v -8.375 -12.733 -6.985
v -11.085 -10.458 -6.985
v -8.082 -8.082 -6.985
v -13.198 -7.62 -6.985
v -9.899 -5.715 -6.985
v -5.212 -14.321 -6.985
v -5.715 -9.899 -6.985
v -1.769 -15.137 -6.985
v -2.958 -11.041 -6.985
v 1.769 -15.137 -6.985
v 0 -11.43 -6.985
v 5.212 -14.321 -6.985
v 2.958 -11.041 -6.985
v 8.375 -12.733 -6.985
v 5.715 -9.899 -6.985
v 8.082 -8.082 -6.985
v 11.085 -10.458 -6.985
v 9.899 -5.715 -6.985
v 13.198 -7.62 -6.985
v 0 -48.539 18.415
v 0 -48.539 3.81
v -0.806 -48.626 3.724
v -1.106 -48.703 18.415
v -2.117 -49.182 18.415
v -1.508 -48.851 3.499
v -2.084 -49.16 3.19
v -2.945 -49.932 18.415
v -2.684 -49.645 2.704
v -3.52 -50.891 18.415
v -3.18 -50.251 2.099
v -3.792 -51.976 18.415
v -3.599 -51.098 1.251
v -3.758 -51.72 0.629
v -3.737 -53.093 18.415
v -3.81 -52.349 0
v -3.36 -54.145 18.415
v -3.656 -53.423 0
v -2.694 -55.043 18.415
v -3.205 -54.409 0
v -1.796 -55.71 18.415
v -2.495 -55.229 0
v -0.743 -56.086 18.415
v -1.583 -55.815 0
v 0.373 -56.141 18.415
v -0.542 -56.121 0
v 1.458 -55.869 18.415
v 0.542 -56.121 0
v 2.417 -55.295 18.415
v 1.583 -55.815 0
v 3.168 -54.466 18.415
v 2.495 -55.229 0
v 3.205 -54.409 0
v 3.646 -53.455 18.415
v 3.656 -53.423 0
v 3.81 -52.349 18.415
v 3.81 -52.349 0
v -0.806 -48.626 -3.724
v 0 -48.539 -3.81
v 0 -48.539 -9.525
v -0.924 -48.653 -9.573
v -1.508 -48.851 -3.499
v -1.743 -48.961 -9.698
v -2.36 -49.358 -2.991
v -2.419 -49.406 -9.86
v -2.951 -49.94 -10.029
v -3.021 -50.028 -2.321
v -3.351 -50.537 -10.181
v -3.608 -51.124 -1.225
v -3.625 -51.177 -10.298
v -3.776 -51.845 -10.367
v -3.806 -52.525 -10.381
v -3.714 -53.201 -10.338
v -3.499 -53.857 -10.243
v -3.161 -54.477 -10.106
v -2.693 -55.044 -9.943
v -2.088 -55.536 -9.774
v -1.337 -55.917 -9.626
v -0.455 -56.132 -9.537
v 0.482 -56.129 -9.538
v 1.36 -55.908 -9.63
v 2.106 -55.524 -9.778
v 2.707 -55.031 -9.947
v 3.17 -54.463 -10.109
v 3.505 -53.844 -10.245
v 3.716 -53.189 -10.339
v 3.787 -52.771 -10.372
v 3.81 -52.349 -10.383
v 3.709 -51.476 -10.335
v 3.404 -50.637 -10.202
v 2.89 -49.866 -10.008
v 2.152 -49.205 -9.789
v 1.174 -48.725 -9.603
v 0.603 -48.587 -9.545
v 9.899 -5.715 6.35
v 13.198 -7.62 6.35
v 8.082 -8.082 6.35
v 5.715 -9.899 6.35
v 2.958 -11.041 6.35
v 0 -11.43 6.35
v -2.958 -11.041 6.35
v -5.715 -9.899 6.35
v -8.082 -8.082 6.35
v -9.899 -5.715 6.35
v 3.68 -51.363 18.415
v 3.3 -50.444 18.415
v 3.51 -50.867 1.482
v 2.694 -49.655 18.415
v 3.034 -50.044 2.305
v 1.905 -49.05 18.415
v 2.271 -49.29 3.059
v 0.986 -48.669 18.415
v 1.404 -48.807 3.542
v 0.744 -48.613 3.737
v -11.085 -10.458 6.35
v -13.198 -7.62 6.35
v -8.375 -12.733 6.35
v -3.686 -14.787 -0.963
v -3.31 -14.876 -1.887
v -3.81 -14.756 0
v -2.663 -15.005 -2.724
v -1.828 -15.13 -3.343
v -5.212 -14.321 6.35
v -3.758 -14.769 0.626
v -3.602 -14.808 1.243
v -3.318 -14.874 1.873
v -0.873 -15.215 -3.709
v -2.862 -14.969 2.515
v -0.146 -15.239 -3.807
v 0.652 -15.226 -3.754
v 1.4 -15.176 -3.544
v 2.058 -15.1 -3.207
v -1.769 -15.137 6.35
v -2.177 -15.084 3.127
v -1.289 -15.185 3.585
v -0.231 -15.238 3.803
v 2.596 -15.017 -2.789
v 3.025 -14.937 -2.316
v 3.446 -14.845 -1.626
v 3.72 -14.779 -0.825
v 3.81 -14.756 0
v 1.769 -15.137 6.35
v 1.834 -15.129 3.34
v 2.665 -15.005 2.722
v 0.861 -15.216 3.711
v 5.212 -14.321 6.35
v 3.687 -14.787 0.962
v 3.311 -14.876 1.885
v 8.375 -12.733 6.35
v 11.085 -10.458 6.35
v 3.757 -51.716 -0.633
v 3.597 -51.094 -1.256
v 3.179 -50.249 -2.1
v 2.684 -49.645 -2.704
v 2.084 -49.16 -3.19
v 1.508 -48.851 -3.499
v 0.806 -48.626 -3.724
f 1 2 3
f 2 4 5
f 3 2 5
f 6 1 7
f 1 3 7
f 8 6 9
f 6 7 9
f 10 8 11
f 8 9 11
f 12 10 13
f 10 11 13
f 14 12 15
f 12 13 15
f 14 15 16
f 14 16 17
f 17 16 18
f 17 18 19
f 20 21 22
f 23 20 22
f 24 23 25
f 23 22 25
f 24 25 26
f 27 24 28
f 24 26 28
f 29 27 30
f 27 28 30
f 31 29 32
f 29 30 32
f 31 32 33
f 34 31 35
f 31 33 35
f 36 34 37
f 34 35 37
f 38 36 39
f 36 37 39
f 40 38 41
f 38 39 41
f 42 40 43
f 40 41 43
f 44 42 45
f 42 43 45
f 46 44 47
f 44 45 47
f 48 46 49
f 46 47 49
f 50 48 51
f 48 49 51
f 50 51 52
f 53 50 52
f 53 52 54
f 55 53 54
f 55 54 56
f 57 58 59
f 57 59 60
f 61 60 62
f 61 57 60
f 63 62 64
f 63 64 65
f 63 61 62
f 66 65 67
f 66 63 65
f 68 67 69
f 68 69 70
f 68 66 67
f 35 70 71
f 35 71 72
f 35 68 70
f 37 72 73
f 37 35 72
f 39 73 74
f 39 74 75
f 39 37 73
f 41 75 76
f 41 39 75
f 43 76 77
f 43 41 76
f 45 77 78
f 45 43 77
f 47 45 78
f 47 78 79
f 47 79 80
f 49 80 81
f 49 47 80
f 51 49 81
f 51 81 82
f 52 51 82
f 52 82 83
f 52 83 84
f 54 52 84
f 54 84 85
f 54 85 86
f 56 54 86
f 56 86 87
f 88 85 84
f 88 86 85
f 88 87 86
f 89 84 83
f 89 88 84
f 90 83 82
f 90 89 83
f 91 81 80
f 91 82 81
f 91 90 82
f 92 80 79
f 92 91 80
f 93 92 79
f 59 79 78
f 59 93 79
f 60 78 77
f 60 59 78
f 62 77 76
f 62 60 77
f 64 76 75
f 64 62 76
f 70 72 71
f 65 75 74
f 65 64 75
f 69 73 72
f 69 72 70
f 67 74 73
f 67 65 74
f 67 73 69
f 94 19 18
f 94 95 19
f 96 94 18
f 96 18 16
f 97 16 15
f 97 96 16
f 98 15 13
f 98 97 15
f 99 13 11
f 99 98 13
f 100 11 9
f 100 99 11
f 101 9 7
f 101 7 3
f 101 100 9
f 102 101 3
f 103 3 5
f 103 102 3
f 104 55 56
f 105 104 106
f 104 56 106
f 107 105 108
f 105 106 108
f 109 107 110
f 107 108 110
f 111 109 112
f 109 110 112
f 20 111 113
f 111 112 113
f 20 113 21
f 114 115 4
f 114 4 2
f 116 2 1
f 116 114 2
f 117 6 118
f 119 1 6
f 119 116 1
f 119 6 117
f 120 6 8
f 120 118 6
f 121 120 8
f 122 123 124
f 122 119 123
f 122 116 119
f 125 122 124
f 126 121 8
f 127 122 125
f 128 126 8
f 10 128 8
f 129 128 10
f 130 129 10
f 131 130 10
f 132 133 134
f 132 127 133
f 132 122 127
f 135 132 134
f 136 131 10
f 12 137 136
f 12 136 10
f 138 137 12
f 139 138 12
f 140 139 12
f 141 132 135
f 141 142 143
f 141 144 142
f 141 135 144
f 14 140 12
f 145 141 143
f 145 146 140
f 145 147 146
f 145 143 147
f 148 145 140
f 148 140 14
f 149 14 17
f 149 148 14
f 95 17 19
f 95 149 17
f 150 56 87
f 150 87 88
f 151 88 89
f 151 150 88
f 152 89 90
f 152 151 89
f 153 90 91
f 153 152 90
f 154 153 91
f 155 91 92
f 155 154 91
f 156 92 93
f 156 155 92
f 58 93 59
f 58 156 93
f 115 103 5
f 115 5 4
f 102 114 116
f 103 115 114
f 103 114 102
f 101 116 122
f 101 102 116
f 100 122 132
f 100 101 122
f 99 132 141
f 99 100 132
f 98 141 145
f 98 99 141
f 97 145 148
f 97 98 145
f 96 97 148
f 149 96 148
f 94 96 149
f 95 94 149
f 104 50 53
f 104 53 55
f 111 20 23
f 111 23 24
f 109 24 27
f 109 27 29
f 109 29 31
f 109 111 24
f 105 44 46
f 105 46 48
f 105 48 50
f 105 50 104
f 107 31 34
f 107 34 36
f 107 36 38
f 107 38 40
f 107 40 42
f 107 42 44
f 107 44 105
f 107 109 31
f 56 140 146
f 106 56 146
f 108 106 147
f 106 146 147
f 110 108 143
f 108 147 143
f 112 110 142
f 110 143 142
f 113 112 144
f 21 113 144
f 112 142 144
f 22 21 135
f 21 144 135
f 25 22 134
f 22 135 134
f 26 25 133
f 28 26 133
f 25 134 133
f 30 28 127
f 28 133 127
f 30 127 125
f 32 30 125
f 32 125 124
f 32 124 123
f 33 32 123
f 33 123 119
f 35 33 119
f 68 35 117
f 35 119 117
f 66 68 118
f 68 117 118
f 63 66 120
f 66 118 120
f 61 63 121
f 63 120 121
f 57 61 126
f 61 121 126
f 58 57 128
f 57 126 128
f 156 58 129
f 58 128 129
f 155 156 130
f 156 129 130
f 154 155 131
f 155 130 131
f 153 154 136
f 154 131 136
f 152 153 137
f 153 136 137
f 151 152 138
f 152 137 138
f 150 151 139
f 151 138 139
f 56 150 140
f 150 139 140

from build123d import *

# Parameters (mm, degrees)
F0_R          = 3.81
F1_DEPTH      = 52.3494
F3_DEPTH      = 25.4
F3_DEPTH_BACK = 25.4
F4_DEPTH      = 6.35
F4_DEPTH_BACK = 6.985
F6_DEPTH      = 18.415
F6_DEPTH_BACK = 18.415
F7_R          = 8.89
F8_DEPTH      = 66.62603


with BuildPart() as f1:
    # F0 (on Front) → F1 (new body)
    with BuildSketch(Plane.XZ):
        Circle(F0_R)
    extrude(amount=F1_DEPTH)

    # F2 (on Top) → F3 (cut, two sides)
    with BuildSketch(Plane.XY) as f3_sk:
        with BuildLine():
            Line((0, 0), (-11.43, 0))
            ThreePointArc((-11.43, 0), (-11.0405321945, -2.9583016855), (-9.8986703653, -5.715))
            Line((-9.8986703653, -5.715), (0, 0))
        make_face()
        with BuildLine():
            ThreePointArc((-9.8986703653, -5.715), (0, -11.43), (9.8986703653, -5.715))
            Line((9.8986703653, -5.715), (0, 0))
            Line((0, 0), (-9.8986703653, -5.715))
        make_face()
        with BuildLine():
            ThreePointArc((9.8986703653, -5.715), (11.0405321945, -2.9583016855), (11.43, 0))
            Line((11.43, 0), (0, 0))
            Line((0, 0), (9.8986703653, -5.715))
        make_face()
    extrude(amount=F3_DEPTH, mode=Mode.SUBTRACT)
    extrude(f3_sk.sketch, amount=-F3_DEPTH_BACK, mode=Mode.SUBTRACT)

    # F2 (on Top) → F4 (join, two sides)
    with BuildSketch(Plane.XY) as f4_sk:
        with BuildLine():
            Line((13.1982271537, -7.62), (9.8986703653, -5.715))
            ThreePointArc((9.8986703653, -5.715), (0, -11.43), (-9.8986703653, -5.715))
            Line((-9.8986703653, -5.715), (-13.1982271537, -7.62))
            ThreePointArc((-13.1982271537, -7.62), (0, -15.24), (13.1982271537, -7.62))
        make_face()
    extrude(amount=F4_DEPTH)
    extrude(f4_sk.sketch, amount=-F4_DEPTH_BACK)

    # F5 (on Top) → F6 (join, two sides)
    with BuildSketch(Plane.XY) as f6_sk:
        with BuildLine():
            ThreePointArc((0, -48.5394), (-2.6940768363, -55.0434768363), (3.81, -52.3494))
            ThreePointArc((3.81, -52.3494), (2.6940768363, -49.6553231637), (0, -48.5394))
        make_face()
    extrude(amount=F6_DEPTH)
    extrude(f6_sk.sketch, amount=-F6_DEPTH_BACK)

    # F7 (on Front) → F8 (cut)
    with BuildSketch(Plane.XZ):
        with Locations((0, -18.415)):
            Circle(F7_R)
    extrude(amount=F8_DEPTH, mode=Mode.SUBTRACT)


solid = f1.part
